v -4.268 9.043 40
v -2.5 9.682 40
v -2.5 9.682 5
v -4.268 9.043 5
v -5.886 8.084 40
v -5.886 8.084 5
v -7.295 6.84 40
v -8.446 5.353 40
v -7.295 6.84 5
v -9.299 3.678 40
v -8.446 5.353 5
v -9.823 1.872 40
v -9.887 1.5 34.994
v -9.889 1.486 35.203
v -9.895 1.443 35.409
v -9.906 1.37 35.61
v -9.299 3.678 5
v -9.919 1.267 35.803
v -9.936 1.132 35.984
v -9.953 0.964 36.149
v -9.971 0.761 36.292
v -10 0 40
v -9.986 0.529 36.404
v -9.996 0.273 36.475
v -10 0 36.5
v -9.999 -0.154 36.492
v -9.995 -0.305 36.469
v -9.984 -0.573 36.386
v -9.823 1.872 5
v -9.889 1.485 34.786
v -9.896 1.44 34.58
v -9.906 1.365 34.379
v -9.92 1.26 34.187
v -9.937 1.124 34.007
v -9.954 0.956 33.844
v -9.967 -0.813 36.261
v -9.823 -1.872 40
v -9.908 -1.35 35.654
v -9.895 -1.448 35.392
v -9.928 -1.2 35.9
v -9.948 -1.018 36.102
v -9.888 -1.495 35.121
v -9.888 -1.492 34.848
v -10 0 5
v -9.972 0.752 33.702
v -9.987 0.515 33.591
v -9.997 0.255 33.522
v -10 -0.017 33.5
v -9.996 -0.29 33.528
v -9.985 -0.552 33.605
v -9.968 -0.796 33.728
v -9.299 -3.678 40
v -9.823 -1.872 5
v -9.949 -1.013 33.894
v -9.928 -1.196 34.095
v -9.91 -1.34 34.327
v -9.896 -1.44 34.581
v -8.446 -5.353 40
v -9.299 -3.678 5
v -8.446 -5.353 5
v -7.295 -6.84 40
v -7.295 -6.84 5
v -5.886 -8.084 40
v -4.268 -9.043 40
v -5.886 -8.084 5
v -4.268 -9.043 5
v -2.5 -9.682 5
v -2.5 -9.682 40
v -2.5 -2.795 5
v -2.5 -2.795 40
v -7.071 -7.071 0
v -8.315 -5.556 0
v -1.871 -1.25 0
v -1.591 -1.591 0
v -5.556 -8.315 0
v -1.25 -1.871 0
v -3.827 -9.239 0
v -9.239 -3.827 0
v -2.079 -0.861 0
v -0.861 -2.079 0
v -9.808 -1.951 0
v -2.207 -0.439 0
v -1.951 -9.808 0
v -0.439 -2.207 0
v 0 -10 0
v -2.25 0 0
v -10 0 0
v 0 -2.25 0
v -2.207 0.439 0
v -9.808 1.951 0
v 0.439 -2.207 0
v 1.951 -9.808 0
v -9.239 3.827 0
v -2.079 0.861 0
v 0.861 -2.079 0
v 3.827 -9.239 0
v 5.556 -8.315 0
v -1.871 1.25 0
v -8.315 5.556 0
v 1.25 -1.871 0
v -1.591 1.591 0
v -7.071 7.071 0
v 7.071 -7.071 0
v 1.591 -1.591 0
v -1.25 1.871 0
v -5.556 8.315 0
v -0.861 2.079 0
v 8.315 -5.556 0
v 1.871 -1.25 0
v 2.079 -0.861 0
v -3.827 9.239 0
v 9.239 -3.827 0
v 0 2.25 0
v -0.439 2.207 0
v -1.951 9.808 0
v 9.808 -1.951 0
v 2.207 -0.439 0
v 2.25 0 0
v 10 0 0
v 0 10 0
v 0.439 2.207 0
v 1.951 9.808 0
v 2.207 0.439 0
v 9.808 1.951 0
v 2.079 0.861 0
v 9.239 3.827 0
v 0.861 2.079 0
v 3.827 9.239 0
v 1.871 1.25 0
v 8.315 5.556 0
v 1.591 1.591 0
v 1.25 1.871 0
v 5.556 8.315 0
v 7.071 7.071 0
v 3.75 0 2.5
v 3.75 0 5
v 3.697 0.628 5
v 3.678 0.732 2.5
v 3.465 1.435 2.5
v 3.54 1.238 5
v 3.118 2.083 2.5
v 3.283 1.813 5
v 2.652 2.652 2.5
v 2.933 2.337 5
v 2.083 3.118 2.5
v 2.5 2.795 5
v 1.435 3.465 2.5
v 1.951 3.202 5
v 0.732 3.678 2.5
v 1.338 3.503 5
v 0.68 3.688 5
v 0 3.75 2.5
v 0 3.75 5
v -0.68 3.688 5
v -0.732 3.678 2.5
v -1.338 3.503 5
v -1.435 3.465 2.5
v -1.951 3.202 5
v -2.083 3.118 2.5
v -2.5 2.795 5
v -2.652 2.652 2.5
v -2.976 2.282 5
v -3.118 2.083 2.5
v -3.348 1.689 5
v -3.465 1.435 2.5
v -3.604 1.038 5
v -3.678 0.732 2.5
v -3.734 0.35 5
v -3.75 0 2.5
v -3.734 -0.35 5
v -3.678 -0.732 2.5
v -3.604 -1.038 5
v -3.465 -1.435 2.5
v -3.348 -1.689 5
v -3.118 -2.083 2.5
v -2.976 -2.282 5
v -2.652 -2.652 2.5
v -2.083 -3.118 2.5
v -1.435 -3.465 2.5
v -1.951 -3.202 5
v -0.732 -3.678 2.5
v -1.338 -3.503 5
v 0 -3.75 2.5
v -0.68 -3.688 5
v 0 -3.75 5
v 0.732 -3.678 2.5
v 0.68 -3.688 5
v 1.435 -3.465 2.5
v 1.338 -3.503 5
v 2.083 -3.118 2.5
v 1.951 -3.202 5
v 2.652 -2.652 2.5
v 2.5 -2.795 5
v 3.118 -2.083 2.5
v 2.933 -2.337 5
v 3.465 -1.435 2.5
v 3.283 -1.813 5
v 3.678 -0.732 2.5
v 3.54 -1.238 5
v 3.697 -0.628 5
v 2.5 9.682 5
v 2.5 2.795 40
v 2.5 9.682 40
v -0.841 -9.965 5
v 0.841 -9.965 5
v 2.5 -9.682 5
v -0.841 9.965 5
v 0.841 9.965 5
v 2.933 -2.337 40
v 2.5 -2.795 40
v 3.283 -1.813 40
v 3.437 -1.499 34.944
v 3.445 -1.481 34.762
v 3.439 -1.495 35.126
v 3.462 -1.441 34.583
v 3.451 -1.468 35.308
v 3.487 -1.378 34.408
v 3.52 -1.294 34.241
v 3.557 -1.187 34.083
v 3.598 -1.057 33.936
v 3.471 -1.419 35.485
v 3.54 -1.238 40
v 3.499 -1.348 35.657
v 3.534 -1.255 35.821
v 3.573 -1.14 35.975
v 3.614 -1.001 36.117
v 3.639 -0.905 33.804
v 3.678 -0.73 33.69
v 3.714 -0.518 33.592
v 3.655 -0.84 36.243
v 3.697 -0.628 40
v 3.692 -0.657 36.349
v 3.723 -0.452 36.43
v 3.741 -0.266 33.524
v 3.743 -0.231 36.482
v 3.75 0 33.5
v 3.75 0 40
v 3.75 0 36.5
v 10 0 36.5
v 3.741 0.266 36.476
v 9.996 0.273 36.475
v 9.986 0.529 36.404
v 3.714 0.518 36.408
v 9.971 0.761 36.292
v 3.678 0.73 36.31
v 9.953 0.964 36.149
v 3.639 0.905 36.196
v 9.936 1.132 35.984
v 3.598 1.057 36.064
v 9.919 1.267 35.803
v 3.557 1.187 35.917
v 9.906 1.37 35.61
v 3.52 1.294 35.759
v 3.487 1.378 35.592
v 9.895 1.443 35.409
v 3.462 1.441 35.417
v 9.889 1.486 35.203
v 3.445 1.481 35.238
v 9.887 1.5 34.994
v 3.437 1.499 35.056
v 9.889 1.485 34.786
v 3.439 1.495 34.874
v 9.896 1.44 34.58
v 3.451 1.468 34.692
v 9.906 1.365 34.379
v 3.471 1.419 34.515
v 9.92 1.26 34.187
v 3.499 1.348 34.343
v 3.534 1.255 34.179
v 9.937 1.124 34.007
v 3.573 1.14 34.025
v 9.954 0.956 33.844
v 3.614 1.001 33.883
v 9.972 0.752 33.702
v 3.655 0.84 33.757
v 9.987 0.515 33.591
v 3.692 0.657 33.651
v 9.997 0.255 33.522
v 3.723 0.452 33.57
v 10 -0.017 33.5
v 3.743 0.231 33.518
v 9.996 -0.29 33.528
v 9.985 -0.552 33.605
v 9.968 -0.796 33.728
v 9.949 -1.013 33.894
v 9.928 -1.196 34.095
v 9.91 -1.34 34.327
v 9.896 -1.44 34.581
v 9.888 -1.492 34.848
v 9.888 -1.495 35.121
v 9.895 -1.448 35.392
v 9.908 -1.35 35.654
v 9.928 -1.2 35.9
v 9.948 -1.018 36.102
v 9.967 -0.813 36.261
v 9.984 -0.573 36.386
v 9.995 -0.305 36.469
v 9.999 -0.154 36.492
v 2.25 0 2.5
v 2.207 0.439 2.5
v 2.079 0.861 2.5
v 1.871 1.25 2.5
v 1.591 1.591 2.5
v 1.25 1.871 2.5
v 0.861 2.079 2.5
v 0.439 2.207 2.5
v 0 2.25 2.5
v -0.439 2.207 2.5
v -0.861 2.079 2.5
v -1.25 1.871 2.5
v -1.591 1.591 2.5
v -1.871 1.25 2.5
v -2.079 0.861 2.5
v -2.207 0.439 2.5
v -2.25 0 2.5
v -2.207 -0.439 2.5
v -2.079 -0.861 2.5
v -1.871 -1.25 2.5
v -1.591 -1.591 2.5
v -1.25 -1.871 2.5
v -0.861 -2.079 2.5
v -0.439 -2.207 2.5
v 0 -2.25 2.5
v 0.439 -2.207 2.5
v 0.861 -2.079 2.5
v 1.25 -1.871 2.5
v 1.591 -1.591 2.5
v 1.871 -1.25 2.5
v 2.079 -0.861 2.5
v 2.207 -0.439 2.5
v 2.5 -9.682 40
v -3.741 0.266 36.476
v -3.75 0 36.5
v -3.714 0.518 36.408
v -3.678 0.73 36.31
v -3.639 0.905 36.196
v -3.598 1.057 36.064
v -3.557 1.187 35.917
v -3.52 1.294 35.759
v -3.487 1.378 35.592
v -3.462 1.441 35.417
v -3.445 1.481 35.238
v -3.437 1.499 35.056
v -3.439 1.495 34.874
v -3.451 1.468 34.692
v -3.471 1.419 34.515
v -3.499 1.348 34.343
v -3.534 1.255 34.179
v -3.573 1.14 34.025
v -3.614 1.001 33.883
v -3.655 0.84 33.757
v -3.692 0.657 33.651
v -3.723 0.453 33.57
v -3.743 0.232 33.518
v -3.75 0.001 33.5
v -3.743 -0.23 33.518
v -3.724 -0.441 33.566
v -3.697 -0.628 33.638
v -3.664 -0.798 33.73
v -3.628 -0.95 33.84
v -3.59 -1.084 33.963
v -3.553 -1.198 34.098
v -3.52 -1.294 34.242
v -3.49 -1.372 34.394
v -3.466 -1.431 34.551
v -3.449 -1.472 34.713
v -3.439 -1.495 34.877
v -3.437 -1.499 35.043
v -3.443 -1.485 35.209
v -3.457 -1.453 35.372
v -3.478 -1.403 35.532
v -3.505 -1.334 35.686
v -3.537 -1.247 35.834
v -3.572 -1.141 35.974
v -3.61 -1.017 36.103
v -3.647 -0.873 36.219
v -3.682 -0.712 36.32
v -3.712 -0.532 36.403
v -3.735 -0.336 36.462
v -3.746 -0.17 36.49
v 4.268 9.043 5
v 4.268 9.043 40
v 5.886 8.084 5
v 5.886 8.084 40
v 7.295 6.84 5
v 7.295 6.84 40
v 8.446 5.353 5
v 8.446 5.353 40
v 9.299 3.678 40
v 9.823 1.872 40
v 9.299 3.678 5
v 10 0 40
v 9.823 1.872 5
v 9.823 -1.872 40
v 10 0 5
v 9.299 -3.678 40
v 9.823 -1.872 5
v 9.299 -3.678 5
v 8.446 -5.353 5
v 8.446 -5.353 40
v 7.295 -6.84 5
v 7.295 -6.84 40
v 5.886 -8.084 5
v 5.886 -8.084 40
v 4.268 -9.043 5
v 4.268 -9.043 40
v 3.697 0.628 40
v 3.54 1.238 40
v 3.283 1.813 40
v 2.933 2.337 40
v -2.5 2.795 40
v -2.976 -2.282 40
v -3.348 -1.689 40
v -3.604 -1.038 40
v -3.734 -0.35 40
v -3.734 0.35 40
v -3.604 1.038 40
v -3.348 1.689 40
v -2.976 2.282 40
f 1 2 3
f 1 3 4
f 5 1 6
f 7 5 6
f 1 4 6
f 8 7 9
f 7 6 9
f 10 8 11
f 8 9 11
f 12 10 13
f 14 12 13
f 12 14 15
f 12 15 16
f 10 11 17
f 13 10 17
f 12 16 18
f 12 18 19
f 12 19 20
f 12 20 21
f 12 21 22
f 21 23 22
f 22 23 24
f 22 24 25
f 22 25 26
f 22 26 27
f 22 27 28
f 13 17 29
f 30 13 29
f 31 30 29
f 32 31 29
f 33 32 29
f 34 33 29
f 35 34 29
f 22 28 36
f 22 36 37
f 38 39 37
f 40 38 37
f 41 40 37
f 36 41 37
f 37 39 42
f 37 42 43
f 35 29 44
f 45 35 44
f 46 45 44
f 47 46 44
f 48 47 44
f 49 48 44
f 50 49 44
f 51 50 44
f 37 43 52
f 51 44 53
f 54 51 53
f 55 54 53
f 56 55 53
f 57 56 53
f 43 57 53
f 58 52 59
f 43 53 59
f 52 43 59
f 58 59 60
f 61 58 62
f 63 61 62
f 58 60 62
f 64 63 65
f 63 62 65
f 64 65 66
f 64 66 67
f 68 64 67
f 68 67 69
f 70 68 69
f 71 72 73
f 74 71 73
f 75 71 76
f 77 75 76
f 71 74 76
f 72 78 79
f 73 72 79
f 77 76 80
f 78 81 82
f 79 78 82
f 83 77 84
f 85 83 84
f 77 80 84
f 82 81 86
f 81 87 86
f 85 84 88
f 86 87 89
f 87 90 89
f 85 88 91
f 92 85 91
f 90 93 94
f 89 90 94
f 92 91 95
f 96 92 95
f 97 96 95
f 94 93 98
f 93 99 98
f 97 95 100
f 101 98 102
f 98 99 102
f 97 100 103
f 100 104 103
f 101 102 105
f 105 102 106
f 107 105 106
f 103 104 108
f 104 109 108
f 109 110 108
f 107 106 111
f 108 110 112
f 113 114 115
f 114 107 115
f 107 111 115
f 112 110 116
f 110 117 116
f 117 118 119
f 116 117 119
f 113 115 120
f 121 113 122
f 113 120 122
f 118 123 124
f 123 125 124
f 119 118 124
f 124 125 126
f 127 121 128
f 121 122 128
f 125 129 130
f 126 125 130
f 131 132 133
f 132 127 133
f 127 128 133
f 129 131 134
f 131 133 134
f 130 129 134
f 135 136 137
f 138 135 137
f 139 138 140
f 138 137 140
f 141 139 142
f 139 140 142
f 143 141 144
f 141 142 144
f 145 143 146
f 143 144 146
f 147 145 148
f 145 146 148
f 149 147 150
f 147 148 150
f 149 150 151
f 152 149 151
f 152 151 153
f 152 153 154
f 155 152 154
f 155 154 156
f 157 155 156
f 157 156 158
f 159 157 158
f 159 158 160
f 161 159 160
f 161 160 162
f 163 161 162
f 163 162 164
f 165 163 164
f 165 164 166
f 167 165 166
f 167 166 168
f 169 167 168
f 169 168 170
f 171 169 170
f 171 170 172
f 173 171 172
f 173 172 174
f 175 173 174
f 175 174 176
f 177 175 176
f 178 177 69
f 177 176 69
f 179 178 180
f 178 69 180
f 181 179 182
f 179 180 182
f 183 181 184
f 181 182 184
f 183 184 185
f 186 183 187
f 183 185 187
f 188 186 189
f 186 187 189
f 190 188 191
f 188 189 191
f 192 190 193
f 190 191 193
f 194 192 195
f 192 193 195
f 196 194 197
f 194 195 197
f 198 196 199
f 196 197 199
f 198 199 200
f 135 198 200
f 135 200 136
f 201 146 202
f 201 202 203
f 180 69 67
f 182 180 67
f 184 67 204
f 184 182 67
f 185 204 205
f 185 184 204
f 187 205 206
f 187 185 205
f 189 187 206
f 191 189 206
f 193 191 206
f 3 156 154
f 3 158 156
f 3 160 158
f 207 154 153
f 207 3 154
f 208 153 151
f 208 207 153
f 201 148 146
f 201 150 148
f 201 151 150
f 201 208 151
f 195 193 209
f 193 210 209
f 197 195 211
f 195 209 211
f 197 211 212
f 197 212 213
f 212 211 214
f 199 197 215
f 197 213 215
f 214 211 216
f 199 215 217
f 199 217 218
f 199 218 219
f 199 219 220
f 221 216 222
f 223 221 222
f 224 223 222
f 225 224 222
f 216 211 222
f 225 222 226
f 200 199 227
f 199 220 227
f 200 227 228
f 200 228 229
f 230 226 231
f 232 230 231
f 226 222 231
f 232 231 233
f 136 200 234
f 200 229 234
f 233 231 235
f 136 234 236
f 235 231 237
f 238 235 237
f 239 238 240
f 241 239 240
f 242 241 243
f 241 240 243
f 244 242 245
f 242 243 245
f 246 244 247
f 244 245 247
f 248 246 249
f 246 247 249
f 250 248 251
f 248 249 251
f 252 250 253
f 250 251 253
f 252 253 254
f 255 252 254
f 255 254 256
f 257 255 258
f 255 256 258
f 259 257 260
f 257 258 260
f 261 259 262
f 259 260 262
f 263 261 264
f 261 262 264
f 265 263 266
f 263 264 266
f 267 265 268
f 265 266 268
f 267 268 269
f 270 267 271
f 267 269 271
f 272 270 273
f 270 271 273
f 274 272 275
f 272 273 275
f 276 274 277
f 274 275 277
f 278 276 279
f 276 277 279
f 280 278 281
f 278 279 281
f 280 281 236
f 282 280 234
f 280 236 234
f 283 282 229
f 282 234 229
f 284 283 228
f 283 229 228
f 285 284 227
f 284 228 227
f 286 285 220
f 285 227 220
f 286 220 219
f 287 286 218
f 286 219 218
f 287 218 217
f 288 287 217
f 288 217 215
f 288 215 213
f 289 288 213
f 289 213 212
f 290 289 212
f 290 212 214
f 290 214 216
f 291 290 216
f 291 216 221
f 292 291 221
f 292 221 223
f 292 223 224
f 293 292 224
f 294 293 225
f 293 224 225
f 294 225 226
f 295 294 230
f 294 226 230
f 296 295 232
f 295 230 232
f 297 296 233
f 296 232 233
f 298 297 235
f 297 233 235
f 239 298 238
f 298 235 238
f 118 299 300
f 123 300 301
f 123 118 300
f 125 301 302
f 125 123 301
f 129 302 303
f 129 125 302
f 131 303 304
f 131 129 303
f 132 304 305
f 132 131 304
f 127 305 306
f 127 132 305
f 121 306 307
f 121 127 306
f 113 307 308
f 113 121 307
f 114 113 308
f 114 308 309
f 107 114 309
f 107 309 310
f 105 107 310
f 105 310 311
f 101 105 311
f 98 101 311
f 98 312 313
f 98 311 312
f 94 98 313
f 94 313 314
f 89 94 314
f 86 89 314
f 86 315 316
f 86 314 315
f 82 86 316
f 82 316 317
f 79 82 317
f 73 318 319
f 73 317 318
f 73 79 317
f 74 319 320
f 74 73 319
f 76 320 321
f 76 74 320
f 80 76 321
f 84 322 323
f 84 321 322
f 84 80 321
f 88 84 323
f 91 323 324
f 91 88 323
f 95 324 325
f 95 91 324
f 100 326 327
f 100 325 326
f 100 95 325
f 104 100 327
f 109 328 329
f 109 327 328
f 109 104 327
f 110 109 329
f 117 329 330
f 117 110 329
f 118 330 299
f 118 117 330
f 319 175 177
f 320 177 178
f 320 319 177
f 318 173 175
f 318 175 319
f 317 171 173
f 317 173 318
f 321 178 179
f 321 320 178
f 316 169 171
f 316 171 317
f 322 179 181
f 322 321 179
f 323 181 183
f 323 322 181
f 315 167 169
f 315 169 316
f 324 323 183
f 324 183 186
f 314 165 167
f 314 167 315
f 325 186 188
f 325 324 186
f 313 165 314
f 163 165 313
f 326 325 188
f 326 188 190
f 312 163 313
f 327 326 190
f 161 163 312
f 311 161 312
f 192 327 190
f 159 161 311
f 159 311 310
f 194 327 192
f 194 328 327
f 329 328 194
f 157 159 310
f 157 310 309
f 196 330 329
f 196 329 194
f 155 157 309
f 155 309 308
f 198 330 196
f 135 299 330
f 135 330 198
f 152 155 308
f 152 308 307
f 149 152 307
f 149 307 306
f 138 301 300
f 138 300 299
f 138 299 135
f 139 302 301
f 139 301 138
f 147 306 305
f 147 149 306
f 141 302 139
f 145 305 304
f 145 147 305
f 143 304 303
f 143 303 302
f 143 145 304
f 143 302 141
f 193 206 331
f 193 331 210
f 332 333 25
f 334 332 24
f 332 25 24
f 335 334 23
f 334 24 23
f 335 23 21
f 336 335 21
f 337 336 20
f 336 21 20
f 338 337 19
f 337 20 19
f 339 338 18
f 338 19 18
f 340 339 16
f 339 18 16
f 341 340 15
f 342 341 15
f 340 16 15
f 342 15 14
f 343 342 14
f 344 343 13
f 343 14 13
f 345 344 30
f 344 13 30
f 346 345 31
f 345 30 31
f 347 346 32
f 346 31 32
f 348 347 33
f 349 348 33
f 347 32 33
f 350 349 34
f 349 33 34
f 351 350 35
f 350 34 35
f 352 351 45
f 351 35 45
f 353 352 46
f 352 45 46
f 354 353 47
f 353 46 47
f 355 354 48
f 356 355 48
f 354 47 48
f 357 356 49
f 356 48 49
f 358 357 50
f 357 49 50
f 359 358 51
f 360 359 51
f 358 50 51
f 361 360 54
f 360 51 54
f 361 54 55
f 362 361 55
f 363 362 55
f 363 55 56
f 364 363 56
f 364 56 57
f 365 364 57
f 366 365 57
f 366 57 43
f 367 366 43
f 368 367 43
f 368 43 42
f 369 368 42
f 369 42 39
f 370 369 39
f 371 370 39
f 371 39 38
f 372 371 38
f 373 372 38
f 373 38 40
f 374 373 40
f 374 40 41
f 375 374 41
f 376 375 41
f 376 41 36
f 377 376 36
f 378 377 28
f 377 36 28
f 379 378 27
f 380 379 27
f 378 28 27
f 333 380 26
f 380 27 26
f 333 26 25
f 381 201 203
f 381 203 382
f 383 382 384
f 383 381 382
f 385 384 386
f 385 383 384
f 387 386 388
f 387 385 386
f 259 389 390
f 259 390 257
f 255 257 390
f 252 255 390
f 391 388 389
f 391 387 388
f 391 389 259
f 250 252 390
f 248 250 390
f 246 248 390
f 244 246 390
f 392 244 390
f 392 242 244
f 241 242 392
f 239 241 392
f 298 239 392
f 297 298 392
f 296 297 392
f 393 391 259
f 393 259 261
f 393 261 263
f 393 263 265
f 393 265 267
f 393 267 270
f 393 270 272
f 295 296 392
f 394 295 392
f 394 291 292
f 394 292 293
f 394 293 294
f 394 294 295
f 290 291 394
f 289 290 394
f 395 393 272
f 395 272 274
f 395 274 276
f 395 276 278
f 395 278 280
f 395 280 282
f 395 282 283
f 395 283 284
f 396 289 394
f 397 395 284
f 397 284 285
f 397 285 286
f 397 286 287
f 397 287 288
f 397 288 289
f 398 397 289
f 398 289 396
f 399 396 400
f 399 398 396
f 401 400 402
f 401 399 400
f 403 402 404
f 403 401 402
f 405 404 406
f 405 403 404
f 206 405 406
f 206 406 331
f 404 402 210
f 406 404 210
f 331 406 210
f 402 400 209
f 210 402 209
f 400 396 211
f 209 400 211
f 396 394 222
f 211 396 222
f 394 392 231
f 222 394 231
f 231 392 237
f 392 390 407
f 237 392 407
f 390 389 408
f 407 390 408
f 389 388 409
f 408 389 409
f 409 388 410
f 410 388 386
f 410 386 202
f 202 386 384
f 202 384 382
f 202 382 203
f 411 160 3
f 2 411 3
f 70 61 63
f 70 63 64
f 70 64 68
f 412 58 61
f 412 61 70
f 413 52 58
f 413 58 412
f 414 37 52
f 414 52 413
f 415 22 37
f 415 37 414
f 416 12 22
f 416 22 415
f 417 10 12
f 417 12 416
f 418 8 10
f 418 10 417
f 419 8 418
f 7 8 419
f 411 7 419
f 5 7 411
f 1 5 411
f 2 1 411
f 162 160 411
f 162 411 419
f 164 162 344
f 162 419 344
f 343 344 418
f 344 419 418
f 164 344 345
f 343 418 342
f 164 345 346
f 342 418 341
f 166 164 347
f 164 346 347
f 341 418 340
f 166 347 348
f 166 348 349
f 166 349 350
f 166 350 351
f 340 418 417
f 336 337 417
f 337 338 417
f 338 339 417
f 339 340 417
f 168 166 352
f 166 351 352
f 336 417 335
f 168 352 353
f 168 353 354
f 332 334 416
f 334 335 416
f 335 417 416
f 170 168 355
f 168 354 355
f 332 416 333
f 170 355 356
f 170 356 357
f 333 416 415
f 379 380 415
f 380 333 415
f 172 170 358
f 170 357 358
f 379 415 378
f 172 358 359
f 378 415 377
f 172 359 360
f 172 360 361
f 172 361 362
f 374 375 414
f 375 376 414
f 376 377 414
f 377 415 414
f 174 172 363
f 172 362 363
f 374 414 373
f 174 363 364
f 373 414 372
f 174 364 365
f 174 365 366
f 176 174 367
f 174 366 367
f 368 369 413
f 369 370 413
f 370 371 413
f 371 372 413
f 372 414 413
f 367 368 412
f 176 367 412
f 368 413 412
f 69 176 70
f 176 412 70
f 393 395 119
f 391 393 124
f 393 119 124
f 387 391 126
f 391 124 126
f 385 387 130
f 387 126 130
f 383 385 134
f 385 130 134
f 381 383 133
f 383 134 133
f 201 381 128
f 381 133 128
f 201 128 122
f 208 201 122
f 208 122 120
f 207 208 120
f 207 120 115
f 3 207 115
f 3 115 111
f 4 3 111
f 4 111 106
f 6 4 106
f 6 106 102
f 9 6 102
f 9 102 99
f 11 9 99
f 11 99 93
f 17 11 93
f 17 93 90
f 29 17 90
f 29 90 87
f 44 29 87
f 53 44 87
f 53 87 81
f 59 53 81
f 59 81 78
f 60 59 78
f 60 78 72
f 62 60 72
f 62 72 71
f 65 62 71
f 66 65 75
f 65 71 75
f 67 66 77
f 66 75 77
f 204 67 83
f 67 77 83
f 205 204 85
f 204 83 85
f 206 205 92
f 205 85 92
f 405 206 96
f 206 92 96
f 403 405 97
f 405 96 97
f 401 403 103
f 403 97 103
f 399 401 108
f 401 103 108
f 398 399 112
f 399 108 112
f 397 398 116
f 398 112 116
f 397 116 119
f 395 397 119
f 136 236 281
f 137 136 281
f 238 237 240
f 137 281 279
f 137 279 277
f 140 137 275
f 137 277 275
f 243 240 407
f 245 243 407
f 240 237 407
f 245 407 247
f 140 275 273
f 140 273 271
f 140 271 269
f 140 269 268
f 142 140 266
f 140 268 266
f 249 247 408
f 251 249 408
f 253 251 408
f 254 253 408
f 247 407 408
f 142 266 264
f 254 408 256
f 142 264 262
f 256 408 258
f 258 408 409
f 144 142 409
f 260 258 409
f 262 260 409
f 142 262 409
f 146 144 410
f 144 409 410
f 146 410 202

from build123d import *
from build123d.topology import SkipClean

# Parameters (mm, degrees)
CROQUIS1_R              = 10
CROQUIS1_R_2            = 2.25
SALIENTE_EXTRUIR1_DEPTH = 5
SALIENTE_EXTRUIR2_DEPTH = 35
CROQUIS3_R              = 1.5
CORTAR_EXTRUIR1_DEPTH   = 20
CROQUIS4_R              = 3.75
CORTAR_EXTRUIR2_DEPTH   = 2.5
CORTAR_EXTRUIR4_START   = 49
CROQUIS6_R              = 3.75
CORTAR_EXTRUIR4_DEPTH   = 49


with BuildPart() as part:
    # Croquis1 → Saliente-Extruir1 (new body)
    with BuildSketch(Plane.XY):
        Circle(CROQUIS1_R)
        Circle(CROQUIS1_R_2, mode=Mode.SUBTRACT)
    extrude(amount=SALIENTE_EXTRUIR1_DEPTH)

    # Croquis2 → Saliente-Extruir2 (add)
    with SkipClean():  # the faces are left unmerged after this step: merging them gives an invalid solid
        with BuildSketch(Plane.XY.offset(5)):
            with BuildLine():
                Line((-2.5, -9.682458366), (-2.5, 9.682458366))
                ThreePointArc((-2.5, 9.682458366), (-10, 0), (-2.5, -9.682458366))
            make_face()
            with BuildLine():
                Line((2.5, -9.682458366), (2.5, 9.682458366))
                ThreePointArc((2.5, 9.682458366), (10, 0), (2.5, -9.682458366))
            make_face()
        extrude(amount=SALIENTE_EXTRUIR2_DEPTH)
    add(part.part.scale(1), mode=Mode.REPLACE)  # the faces are merged on a copy

    # Croquis3 → Cortar-Extruir1 (cut, symmetric)
    with BuildSketch(Plane.ZY.offset(-2.5)):
        with Locations((35, 0)):
            Circle(CROQUIS3_R)
    extrude(amount=CORTAR_EXTRUIR1_DEPTH, both=True, mode=Mode.SUBTRACT)

    # Croquis4 → Cortar-Extruir2 (cut)
    with BuildSketch(Plane.XY.offset(5)):
        Circle(CROQUIS4_R)
    extrude(amount=-CORTAR_EXTRUIR2_DEPTH, mode=Mode.SUBTRACT)

    # Croquis6 → Cortar-Extruir4 (cut)
    with SkipClean():  # the faces are left unmerged after this step: merging them gives an invalid solid
        with BuildSketch(Plane.XY.offset(2.5).offset(CORTAR_EXTRUIR4_START)):
            Circle(CROQUIS6_R)
        extrude(amount=-CORTAR_EXTRUIR4_DEPTH, mode=Mode.SUBTRACT)


solid = part.part
